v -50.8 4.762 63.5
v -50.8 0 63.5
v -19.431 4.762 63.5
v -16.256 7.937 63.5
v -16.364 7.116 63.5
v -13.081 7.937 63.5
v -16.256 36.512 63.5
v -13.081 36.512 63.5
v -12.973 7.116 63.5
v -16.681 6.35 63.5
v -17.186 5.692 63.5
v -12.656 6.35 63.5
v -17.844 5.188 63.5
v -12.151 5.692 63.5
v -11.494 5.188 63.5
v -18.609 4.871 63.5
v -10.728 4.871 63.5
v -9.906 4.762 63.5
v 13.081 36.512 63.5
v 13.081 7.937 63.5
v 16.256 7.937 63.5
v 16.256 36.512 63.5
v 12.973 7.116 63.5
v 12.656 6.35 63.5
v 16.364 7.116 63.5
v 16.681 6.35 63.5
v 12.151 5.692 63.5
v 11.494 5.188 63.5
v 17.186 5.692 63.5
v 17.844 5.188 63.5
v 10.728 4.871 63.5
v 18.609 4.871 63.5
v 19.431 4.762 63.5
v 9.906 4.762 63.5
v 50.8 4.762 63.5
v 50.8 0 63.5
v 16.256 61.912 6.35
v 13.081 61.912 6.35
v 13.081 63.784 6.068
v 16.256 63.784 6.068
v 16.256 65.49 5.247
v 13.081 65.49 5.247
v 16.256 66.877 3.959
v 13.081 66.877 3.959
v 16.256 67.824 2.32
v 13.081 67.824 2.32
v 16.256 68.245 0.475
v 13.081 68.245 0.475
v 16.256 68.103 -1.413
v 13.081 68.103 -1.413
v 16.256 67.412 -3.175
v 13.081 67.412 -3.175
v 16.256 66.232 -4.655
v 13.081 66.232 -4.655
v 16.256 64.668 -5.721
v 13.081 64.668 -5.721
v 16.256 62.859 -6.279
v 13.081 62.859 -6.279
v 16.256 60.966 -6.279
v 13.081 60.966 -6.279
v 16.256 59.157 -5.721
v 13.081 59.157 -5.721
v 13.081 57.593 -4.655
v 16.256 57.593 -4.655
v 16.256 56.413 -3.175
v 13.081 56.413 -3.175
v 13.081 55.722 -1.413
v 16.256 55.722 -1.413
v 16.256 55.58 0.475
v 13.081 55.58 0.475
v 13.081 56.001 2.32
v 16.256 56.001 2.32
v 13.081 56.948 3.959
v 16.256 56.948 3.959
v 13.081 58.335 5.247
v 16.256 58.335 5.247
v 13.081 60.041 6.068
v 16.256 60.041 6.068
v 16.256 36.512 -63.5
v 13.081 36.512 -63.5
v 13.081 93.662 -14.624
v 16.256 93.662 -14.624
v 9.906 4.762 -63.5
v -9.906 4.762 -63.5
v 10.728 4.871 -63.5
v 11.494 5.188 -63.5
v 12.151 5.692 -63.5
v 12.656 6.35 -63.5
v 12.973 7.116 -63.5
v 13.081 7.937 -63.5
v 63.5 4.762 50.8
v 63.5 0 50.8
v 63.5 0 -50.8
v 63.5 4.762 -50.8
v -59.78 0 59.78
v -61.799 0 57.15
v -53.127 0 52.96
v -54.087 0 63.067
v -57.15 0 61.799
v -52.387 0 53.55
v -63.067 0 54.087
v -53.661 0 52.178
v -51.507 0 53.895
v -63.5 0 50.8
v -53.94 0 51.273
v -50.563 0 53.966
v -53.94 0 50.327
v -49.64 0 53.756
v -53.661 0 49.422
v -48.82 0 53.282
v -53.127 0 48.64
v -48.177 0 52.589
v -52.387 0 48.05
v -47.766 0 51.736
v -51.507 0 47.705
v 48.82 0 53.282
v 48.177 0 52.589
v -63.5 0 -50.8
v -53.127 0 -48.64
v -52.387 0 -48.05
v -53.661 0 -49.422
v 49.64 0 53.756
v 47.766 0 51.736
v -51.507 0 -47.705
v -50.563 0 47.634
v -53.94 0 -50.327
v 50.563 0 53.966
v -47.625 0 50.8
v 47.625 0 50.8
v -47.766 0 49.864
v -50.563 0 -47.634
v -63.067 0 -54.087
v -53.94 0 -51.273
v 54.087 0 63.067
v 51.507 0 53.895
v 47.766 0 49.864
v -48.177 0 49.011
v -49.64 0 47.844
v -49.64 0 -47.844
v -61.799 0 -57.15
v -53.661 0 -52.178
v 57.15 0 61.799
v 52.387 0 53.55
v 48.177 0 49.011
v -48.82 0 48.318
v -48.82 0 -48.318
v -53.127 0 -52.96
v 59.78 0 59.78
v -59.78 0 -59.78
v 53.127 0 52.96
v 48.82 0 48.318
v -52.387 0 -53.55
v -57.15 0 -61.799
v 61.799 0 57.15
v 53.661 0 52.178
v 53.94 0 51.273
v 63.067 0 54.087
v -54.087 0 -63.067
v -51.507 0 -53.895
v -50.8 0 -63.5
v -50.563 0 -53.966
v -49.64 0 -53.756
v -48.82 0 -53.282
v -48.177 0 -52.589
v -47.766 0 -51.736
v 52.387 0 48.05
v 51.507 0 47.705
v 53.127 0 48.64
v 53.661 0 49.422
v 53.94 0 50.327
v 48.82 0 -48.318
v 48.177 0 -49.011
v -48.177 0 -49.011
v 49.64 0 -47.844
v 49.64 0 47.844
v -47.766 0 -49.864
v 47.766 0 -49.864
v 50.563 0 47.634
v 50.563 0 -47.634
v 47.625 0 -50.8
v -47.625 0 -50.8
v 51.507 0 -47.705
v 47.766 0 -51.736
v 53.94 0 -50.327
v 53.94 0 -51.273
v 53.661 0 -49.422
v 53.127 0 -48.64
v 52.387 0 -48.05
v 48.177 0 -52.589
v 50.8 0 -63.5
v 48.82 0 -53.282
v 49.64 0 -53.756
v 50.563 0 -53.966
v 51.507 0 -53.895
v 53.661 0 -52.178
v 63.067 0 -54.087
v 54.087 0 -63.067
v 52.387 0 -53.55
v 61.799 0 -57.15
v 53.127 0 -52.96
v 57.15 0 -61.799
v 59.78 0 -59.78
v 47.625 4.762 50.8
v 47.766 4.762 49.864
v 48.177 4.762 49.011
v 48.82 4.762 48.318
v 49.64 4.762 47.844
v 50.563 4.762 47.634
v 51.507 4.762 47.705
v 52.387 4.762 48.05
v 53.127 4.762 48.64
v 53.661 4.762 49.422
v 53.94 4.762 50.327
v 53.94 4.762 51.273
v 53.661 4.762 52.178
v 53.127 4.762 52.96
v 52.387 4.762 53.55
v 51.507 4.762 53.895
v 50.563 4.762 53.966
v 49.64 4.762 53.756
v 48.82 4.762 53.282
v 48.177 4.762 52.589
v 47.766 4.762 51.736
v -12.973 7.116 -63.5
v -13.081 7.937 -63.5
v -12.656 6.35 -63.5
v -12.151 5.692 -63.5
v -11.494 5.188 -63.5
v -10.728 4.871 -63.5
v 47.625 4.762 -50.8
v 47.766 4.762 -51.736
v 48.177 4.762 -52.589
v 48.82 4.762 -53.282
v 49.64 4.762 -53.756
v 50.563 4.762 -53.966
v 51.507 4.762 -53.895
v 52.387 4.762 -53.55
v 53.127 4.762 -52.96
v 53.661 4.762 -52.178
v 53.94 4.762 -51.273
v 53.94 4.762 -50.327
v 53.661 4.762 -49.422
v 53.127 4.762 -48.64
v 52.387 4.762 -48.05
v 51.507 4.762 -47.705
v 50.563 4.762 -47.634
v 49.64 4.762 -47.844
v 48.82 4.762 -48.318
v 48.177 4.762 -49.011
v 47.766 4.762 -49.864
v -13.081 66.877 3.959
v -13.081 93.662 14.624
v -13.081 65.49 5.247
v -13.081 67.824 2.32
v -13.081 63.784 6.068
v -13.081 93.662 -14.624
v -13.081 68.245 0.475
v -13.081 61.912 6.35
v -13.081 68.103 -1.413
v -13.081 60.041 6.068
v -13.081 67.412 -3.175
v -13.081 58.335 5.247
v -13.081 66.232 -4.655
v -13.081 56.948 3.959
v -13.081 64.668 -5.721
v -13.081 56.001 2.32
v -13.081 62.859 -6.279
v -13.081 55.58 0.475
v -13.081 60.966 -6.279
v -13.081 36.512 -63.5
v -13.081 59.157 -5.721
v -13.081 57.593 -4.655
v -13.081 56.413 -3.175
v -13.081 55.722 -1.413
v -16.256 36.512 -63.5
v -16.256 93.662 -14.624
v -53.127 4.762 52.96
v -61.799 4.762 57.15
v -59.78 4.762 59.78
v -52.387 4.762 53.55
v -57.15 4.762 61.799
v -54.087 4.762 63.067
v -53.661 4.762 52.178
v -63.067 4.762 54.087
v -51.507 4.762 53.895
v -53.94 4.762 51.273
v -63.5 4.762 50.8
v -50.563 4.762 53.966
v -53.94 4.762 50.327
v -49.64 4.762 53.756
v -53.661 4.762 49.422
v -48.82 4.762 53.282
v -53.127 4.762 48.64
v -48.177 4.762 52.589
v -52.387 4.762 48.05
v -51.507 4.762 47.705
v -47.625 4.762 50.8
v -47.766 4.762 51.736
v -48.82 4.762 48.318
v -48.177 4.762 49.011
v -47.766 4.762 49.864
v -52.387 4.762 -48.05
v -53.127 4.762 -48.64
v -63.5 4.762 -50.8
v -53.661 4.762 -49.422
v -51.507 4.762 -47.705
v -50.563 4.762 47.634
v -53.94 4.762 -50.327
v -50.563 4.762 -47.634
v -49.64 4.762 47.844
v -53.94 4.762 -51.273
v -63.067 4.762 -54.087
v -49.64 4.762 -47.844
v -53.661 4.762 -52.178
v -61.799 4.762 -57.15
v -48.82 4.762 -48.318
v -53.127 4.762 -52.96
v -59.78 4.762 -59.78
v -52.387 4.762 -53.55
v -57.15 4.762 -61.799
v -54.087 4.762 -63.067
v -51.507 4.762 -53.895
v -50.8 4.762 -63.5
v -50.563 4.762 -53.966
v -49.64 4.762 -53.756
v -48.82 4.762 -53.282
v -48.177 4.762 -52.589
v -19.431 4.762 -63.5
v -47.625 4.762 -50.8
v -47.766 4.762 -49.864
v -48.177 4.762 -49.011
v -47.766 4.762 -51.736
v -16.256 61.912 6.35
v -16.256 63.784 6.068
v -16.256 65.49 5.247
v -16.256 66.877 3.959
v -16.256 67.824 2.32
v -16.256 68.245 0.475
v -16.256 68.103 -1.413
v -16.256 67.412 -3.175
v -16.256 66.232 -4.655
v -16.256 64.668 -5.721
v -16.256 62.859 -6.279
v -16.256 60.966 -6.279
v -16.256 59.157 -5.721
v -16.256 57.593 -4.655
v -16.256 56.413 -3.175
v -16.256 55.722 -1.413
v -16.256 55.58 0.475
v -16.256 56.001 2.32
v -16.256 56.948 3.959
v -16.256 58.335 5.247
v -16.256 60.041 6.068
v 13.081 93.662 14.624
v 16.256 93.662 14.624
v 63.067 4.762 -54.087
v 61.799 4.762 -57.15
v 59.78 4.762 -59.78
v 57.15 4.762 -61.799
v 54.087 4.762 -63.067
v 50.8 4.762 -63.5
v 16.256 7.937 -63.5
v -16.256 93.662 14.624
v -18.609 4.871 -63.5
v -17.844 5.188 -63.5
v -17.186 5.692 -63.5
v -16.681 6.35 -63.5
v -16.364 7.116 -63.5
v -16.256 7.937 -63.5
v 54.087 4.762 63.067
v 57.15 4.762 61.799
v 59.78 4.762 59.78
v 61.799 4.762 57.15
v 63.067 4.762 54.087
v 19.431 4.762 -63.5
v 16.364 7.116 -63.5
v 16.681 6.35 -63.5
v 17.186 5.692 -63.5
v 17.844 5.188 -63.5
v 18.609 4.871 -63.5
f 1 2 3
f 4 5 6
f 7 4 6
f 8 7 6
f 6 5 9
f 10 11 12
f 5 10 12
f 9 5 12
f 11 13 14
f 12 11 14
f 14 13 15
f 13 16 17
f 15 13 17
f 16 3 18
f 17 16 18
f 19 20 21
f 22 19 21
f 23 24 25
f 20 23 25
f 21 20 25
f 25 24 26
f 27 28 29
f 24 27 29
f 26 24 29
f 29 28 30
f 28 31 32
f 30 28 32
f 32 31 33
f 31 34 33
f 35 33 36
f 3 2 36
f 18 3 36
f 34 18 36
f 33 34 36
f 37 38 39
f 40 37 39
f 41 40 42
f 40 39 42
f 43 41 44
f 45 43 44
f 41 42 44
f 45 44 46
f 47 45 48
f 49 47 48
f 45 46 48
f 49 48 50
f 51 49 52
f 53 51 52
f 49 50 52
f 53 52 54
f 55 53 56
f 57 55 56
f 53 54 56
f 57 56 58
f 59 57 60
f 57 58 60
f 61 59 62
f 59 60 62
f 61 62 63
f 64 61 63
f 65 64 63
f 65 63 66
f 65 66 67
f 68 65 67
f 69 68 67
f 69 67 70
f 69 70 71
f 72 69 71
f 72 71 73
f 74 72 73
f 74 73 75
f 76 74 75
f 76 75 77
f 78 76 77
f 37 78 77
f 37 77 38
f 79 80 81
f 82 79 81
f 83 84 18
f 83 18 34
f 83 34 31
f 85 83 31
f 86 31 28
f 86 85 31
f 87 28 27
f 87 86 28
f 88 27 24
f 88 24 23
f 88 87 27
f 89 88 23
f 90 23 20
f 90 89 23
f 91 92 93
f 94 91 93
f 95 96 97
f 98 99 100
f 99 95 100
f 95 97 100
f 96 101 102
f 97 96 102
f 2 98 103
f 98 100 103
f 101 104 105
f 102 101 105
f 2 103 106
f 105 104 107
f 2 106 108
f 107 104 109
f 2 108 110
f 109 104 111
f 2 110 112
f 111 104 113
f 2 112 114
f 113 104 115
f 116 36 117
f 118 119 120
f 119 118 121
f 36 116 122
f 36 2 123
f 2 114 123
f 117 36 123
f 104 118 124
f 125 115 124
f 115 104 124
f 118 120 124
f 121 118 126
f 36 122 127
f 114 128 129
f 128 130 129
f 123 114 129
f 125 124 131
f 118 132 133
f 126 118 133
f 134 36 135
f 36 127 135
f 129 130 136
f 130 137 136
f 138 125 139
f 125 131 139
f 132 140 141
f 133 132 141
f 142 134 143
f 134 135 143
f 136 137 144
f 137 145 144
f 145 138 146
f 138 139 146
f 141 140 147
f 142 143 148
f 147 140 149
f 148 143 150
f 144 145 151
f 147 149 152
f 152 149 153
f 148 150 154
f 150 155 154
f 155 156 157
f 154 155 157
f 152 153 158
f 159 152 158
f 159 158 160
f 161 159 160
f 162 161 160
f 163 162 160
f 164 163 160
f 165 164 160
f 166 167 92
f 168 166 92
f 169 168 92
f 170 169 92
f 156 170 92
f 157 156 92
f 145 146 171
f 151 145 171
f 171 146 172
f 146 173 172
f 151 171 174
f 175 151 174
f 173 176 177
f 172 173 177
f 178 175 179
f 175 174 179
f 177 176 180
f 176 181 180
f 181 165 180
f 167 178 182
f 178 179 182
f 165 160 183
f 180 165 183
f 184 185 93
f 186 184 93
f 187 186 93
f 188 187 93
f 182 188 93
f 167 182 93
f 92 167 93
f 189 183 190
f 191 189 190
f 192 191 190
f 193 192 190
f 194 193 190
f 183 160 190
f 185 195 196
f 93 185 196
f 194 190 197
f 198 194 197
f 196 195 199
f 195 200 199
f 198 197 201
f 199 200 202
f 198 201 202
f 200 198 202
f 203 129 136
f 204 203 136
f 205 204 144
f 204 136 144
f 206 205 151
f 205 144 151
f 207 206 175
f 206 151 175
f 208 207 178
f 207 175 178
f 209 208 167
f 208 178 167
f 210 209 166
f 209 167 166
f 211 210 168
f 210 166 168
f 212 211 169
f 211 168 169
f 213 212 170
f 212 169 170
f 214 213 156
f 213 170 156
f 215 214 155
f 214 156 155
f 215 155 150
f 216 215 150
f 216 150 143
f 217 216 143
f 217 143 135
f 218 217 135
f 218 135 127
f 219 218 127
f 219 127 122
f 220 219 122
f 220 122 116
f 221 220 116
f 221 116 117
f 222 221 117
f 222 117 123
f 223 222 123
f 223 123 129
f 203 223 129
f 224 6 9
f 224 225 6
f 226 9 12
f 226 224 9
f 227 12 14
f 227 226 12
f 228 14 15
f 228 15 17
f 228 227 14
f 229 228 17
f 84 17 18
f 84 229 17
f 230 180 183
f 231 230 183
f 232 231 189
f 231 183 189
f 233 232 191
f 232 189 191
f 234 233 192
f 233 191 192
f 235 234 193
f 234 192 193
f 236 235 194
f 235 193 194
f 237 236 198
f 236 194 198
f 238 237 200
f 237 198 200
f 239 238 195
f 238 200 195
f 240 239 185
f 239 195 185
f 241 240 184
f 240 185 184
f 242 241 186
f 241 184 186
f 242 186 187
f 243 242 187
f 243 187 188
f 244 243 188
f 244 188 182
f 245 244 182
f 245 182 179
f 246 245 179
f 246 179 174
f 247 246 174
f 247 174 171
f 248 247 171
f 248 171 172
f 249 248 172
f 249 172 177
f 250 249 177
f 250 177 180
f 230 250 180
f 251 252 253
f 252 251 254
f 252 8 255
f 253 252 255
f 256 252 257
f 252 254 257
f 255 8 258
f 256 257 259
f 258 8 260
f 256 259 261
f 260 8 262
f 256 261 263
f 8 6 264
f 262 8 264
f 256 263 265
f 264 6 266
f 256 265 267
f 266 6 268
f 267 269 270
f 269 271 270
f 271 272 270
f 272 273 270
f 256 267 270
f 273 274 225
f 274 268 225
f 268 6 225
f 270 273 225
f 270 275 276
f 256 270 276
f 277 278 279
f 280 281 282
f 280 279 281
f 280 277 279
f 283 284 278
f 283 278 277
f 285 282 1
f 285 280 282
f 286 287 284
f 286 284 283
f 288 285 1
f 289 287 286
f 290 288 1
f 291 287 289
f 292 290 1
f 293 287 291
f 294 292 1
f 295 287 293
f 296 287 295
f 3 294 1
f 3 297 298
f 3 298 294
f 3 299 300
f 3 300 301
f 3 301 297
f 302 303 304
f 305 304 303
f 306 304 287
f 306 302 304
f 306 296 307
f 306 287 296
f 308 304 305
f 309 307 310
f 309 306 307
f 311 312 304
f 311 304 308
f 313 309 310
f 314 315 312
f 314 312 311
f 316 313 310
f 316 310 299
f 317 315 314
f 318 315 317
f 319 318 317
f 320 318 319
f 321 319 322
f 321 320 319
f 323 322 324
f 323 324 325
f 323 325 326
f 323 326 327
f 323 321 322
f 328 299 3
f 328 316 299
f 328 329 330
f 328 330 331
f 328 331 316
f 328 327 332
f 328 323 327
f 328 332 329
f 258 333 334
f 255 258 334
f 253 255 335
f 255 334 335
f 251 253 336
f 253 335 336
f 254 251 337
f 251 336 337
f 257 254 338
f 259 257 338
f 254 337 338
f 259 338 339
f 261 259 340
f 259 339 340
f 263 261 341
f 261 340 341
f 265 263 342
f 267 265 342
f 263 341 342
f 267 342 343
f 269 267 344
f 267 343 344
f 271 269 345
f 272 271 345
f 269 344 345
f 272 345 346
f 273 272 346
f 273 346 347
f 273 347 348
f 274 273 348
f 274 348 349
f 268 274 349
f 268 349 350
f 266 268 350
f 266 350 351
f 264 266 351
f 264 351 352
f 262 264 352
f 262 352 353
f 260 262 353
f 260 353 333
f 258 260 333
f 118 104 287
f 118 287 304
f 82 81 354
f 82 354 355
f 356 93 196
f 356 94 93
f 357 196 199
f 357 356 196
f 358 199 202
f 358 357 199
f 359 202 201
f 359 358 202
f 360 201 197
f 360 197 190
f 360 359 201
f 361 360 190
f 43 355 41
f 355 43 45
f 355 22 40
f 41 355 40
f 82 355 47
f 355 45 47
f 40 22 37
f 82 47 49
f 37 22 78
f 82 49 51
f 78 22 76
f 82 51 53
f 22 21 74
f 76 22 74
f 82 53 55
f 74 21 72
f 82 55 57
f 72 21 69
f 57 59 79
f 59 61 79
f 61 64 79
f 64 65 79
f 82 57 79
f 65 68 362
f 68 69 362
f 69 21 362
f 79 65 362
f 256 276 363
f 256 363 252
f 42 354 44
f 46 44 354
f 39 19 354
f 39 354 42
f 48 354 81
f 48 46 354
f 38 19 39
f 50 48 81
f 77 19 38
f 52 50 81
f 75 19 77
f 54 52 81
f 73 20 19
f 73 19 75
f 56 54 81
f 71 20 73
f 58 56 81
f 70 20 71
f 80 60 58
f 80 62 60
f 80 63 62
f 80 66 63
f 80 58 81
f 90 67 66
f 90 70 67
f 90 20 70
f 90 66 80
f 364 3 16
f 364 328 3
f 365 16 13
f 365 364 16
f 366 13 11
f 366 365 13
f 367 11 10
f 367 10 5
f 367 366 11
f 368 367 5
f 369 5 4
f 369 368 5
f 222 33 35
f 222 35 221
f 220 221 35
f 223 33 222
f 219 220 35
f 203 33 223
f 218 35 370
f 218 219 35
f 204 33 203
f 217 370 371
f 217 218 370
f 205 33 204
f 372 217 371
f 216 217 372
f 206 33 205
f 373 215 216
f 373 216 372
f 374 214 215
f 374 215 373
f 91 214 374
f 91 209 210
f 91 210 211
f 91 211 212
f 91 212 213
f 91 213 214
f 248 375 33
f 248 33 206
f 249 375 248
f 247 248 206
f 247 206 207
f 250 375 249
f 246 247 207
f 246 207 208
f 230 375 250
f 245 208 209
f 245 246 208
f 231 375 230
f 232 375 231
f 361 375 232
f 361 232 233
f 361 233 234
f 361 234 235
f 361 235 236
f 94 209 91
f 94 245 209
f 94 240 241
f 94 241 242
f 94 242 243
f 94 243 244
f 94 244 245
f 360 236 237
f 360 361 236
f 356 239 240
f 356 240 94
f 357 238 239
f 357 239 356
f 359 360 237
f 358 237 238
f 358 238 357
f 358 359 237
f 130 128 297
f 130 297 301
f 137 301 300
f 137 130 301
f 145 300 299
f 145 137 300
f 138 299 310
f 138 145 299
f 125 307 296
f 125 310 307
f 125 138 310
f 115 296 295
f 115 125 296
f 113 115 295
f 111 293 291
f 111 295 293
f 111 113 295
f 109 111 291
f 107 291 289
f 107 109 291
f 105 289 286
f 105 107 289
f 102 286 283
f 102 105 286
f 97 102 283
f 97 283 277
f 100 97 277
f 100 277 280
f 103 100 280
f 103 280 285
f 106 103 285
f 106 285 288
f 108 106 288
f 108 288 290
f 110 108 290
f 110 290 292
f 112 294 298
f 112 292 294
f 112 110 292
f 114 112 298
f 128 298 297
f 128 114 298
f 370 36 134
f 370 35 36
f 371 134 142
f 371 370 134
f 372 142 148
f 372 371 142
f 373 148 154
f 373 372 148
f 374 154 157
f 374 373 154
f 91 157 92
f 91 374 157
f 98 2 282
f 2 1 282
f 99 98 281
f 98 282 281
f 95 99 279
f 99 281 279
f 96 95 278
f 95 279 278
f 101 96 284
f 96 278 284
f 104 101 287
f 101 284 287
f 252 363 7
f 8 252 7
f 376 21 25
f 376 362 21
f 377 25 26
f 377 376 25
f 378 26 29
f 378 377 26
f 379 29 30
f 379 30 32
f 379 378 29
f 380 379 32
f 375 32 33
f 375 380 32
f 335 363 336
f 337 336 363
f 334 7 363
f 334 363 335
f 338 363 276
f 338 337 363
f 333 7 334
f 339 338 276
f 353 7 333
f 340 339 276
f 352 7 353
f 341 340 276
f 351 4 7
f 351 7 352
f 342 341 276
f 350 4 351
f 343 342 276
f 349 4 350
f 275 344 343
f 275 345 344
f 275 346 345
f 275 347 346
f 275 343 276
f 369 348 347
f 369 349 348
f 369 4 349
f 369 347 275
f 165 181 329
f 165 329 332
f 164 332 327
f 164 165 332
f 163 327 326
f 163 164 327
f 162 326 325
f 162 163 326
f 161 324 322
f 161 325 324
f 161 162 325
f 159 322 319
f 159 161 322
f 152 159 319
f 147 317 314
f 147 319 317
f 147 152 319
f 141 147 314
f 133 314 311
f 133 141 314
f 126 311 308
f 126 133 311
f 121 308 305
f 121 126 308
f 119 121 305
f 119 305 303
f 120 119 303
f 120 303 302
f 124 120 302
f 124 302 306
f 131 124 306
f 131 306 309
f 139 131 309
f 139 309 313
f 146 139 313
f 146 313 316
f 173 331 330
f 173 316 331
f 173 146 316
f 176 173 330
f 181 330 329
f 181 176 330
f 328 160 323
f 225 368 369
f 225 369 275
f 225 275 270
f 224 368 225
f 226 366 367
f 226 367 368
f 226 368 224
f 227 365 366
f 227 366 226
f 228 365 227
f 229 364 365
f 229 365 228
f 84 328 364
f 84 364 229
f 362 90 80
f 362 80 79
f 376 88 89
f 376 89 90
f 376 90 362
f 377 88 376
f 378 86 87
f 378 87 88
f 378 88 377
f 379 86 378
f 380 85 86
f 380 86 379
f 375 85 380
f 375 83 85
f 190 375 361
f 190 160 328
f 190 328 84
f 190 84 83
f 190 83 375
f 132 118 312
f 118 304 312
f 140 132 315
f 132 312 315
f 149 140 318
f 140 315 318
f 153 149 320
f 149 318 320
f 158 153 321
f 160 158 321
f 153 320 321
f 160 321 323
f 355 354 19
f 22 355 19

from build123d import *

# Parameters (mm, degrees)
SKETCH1_W               = 127
SKETCH1_H               = 127
BOSS_EXTRUDE1_DEPTH     = 4.7625
SKETCH2_W               = 3.175
SKETCH2_H               = 127
BOSS_EXTRUDE2_DEPTH     = 88.9
SKETCH3_R               = 6.35
CUT_EXTRUDE1_DEPTH      = 48.244
CUT_EXTRUDE1_DEPTH_BACK = 80.756
FILLET1_R               = 3.175
CHAMFER1_SIZE           = 25.4
CUT_EXTRUDE4_START      = -5.7625
SKETCH4_R               = 3.175
CUT_EXTRUDE4_DEPTH      = 95.6625
FILLET5_R               = 12.7
CUT_EXTRUDE5_DEPTH      = 48.244
CUT_EXTRUDE5_DEPTH_BACK = 80.756


with BuildPart() as part:
    # Sketch1 → Boss-Extrude1 (new body)
    with BuildSketch(Plane(origin=(0, 0, 0), x_dir=(1, 0, 0), z_dir=(0, 1, 0))):
        Rectangle(SKETCH1_W, SKETCH1_H)
    extrude(amount=BOSS_EXTRUDE1_DEPTH)

    # Sketch2 → Boss-Extrude2 (add)
    with BuildSketch(Plane(origin=(0, 4.7625, 0), x_dir=(1, 0, 0), z_dir=(0, 1, 0))):
        with Locations((-14.6685, 0)):
            Rectangle(SKETCH2_W, SKETCH2_H)
        with Locations((14.6685, 0)):
            Rectangle(SKETCH2_W, SKETCH2_H)
    extrude(amount=BOSS_EXTRUDE2_DEPTH)

    # Sketch3 → Cut-Extrude1 (cut, two sides)
    with BuildSketch(Plane.ZY.offset(16.256)) as cut_extrude1_sk:
        with Locations((0, 61.9125)):
            Circle(SKETCH3_R)
    extrude(amount=CUT_EXTRUDE1_DEPTH, mode=Mode.SUBTRACT)
    extrude(cut_extrude1_sk.sketch, amount=-CUT_EXTRUDE1_DEPTH_BACK, mode=Mode.SUBTRACT)

    # Fillet1
    fillet1_edges = [part.edges().sort_by_distance(p)[0] for p in [
        (-16.256, 4.7625, 0),
        (-13.081, 4.7625, 0),
        (13.081, 4.7625, 0),
        (16.256, 4.7625, 0),
    ]]
    fillet(fillet1_edges, radius=FILLET1_R)

    # Chamfer1
    chamfer1_edges = [part.edges().sort_by_distance(p)[0] for p in [
        (-14.6685, 93.6625, 63.5),
        (-14.6685, 93.6625, -63.5),
        (14.6685, 93.6625, 63.5),
        (14.6685, 93.6625, -63.5),
    ]]
    chamfer(chamfer1_edges, length=CHAMFER1_SIZE)

    # Sketch4 → Cut-Extrude4 (cut)
    with BuildSketch(Plane(origin=(0, 4.7625, 0), x_dir=(1, 0, 0), z_dir=(0, 1, 0)).offset(CUT_EXTRUDE4_START)):
        with Locations((-50.8, -50.8)):
            Circle(SKETCH4_R)
        with Locations((-50.8, 50.8)):
            Circle(SKETCH4_R)
    cut_extrude4 = extrude(amount=CUT_EXTRUDE4_DEPTH, mode=Mode.SUBTRACT)

    # Mirror2: Cut-Extrude4 across plane
    add(cut_extrude4.mirror(Plane.ZY), mode=Mode.SUBTRACT)

    # Fillet5
    fillet5_edges = [part.edges().sort_by_distance(p)[0] for p in [
        (-63.5, 2.38125, -63.5),
        (63.5, 2.38125, -63.5),
        (63.5, 2.38125, 63.5),
        (-63.5, 2.38125, 63.5),
    ]]
    fillet(fillet5_edges, radius=FILLET5_R)

    # Sketch7 → Cut-Extrude5 (cut, two sides)
    with BuildSketch(Plane.ZY.offset(16.256)) as cut_extrude5_sk:
        Polygon((-63.5, 36.5125), (-14.62430355, 93.6625), (-38.1, 93.6625), (-63.5, 68.2625), align=None)
        Polygon((38.1, 93.6625), (14.62430355, 93.6625), (63.5, 36.5125), (63.5, 68.2625), align=None)
    extrude(amount=CUT_EXTRUDE5_DEPTH, mode=Mode.SUBTRACT)
    extrude(cut_extrude5_sk.sketch, amount=-CUT_EXTRUDE5_DEPTH_BACK, mode=Mode.SUBTRACT)


solid = part.part
